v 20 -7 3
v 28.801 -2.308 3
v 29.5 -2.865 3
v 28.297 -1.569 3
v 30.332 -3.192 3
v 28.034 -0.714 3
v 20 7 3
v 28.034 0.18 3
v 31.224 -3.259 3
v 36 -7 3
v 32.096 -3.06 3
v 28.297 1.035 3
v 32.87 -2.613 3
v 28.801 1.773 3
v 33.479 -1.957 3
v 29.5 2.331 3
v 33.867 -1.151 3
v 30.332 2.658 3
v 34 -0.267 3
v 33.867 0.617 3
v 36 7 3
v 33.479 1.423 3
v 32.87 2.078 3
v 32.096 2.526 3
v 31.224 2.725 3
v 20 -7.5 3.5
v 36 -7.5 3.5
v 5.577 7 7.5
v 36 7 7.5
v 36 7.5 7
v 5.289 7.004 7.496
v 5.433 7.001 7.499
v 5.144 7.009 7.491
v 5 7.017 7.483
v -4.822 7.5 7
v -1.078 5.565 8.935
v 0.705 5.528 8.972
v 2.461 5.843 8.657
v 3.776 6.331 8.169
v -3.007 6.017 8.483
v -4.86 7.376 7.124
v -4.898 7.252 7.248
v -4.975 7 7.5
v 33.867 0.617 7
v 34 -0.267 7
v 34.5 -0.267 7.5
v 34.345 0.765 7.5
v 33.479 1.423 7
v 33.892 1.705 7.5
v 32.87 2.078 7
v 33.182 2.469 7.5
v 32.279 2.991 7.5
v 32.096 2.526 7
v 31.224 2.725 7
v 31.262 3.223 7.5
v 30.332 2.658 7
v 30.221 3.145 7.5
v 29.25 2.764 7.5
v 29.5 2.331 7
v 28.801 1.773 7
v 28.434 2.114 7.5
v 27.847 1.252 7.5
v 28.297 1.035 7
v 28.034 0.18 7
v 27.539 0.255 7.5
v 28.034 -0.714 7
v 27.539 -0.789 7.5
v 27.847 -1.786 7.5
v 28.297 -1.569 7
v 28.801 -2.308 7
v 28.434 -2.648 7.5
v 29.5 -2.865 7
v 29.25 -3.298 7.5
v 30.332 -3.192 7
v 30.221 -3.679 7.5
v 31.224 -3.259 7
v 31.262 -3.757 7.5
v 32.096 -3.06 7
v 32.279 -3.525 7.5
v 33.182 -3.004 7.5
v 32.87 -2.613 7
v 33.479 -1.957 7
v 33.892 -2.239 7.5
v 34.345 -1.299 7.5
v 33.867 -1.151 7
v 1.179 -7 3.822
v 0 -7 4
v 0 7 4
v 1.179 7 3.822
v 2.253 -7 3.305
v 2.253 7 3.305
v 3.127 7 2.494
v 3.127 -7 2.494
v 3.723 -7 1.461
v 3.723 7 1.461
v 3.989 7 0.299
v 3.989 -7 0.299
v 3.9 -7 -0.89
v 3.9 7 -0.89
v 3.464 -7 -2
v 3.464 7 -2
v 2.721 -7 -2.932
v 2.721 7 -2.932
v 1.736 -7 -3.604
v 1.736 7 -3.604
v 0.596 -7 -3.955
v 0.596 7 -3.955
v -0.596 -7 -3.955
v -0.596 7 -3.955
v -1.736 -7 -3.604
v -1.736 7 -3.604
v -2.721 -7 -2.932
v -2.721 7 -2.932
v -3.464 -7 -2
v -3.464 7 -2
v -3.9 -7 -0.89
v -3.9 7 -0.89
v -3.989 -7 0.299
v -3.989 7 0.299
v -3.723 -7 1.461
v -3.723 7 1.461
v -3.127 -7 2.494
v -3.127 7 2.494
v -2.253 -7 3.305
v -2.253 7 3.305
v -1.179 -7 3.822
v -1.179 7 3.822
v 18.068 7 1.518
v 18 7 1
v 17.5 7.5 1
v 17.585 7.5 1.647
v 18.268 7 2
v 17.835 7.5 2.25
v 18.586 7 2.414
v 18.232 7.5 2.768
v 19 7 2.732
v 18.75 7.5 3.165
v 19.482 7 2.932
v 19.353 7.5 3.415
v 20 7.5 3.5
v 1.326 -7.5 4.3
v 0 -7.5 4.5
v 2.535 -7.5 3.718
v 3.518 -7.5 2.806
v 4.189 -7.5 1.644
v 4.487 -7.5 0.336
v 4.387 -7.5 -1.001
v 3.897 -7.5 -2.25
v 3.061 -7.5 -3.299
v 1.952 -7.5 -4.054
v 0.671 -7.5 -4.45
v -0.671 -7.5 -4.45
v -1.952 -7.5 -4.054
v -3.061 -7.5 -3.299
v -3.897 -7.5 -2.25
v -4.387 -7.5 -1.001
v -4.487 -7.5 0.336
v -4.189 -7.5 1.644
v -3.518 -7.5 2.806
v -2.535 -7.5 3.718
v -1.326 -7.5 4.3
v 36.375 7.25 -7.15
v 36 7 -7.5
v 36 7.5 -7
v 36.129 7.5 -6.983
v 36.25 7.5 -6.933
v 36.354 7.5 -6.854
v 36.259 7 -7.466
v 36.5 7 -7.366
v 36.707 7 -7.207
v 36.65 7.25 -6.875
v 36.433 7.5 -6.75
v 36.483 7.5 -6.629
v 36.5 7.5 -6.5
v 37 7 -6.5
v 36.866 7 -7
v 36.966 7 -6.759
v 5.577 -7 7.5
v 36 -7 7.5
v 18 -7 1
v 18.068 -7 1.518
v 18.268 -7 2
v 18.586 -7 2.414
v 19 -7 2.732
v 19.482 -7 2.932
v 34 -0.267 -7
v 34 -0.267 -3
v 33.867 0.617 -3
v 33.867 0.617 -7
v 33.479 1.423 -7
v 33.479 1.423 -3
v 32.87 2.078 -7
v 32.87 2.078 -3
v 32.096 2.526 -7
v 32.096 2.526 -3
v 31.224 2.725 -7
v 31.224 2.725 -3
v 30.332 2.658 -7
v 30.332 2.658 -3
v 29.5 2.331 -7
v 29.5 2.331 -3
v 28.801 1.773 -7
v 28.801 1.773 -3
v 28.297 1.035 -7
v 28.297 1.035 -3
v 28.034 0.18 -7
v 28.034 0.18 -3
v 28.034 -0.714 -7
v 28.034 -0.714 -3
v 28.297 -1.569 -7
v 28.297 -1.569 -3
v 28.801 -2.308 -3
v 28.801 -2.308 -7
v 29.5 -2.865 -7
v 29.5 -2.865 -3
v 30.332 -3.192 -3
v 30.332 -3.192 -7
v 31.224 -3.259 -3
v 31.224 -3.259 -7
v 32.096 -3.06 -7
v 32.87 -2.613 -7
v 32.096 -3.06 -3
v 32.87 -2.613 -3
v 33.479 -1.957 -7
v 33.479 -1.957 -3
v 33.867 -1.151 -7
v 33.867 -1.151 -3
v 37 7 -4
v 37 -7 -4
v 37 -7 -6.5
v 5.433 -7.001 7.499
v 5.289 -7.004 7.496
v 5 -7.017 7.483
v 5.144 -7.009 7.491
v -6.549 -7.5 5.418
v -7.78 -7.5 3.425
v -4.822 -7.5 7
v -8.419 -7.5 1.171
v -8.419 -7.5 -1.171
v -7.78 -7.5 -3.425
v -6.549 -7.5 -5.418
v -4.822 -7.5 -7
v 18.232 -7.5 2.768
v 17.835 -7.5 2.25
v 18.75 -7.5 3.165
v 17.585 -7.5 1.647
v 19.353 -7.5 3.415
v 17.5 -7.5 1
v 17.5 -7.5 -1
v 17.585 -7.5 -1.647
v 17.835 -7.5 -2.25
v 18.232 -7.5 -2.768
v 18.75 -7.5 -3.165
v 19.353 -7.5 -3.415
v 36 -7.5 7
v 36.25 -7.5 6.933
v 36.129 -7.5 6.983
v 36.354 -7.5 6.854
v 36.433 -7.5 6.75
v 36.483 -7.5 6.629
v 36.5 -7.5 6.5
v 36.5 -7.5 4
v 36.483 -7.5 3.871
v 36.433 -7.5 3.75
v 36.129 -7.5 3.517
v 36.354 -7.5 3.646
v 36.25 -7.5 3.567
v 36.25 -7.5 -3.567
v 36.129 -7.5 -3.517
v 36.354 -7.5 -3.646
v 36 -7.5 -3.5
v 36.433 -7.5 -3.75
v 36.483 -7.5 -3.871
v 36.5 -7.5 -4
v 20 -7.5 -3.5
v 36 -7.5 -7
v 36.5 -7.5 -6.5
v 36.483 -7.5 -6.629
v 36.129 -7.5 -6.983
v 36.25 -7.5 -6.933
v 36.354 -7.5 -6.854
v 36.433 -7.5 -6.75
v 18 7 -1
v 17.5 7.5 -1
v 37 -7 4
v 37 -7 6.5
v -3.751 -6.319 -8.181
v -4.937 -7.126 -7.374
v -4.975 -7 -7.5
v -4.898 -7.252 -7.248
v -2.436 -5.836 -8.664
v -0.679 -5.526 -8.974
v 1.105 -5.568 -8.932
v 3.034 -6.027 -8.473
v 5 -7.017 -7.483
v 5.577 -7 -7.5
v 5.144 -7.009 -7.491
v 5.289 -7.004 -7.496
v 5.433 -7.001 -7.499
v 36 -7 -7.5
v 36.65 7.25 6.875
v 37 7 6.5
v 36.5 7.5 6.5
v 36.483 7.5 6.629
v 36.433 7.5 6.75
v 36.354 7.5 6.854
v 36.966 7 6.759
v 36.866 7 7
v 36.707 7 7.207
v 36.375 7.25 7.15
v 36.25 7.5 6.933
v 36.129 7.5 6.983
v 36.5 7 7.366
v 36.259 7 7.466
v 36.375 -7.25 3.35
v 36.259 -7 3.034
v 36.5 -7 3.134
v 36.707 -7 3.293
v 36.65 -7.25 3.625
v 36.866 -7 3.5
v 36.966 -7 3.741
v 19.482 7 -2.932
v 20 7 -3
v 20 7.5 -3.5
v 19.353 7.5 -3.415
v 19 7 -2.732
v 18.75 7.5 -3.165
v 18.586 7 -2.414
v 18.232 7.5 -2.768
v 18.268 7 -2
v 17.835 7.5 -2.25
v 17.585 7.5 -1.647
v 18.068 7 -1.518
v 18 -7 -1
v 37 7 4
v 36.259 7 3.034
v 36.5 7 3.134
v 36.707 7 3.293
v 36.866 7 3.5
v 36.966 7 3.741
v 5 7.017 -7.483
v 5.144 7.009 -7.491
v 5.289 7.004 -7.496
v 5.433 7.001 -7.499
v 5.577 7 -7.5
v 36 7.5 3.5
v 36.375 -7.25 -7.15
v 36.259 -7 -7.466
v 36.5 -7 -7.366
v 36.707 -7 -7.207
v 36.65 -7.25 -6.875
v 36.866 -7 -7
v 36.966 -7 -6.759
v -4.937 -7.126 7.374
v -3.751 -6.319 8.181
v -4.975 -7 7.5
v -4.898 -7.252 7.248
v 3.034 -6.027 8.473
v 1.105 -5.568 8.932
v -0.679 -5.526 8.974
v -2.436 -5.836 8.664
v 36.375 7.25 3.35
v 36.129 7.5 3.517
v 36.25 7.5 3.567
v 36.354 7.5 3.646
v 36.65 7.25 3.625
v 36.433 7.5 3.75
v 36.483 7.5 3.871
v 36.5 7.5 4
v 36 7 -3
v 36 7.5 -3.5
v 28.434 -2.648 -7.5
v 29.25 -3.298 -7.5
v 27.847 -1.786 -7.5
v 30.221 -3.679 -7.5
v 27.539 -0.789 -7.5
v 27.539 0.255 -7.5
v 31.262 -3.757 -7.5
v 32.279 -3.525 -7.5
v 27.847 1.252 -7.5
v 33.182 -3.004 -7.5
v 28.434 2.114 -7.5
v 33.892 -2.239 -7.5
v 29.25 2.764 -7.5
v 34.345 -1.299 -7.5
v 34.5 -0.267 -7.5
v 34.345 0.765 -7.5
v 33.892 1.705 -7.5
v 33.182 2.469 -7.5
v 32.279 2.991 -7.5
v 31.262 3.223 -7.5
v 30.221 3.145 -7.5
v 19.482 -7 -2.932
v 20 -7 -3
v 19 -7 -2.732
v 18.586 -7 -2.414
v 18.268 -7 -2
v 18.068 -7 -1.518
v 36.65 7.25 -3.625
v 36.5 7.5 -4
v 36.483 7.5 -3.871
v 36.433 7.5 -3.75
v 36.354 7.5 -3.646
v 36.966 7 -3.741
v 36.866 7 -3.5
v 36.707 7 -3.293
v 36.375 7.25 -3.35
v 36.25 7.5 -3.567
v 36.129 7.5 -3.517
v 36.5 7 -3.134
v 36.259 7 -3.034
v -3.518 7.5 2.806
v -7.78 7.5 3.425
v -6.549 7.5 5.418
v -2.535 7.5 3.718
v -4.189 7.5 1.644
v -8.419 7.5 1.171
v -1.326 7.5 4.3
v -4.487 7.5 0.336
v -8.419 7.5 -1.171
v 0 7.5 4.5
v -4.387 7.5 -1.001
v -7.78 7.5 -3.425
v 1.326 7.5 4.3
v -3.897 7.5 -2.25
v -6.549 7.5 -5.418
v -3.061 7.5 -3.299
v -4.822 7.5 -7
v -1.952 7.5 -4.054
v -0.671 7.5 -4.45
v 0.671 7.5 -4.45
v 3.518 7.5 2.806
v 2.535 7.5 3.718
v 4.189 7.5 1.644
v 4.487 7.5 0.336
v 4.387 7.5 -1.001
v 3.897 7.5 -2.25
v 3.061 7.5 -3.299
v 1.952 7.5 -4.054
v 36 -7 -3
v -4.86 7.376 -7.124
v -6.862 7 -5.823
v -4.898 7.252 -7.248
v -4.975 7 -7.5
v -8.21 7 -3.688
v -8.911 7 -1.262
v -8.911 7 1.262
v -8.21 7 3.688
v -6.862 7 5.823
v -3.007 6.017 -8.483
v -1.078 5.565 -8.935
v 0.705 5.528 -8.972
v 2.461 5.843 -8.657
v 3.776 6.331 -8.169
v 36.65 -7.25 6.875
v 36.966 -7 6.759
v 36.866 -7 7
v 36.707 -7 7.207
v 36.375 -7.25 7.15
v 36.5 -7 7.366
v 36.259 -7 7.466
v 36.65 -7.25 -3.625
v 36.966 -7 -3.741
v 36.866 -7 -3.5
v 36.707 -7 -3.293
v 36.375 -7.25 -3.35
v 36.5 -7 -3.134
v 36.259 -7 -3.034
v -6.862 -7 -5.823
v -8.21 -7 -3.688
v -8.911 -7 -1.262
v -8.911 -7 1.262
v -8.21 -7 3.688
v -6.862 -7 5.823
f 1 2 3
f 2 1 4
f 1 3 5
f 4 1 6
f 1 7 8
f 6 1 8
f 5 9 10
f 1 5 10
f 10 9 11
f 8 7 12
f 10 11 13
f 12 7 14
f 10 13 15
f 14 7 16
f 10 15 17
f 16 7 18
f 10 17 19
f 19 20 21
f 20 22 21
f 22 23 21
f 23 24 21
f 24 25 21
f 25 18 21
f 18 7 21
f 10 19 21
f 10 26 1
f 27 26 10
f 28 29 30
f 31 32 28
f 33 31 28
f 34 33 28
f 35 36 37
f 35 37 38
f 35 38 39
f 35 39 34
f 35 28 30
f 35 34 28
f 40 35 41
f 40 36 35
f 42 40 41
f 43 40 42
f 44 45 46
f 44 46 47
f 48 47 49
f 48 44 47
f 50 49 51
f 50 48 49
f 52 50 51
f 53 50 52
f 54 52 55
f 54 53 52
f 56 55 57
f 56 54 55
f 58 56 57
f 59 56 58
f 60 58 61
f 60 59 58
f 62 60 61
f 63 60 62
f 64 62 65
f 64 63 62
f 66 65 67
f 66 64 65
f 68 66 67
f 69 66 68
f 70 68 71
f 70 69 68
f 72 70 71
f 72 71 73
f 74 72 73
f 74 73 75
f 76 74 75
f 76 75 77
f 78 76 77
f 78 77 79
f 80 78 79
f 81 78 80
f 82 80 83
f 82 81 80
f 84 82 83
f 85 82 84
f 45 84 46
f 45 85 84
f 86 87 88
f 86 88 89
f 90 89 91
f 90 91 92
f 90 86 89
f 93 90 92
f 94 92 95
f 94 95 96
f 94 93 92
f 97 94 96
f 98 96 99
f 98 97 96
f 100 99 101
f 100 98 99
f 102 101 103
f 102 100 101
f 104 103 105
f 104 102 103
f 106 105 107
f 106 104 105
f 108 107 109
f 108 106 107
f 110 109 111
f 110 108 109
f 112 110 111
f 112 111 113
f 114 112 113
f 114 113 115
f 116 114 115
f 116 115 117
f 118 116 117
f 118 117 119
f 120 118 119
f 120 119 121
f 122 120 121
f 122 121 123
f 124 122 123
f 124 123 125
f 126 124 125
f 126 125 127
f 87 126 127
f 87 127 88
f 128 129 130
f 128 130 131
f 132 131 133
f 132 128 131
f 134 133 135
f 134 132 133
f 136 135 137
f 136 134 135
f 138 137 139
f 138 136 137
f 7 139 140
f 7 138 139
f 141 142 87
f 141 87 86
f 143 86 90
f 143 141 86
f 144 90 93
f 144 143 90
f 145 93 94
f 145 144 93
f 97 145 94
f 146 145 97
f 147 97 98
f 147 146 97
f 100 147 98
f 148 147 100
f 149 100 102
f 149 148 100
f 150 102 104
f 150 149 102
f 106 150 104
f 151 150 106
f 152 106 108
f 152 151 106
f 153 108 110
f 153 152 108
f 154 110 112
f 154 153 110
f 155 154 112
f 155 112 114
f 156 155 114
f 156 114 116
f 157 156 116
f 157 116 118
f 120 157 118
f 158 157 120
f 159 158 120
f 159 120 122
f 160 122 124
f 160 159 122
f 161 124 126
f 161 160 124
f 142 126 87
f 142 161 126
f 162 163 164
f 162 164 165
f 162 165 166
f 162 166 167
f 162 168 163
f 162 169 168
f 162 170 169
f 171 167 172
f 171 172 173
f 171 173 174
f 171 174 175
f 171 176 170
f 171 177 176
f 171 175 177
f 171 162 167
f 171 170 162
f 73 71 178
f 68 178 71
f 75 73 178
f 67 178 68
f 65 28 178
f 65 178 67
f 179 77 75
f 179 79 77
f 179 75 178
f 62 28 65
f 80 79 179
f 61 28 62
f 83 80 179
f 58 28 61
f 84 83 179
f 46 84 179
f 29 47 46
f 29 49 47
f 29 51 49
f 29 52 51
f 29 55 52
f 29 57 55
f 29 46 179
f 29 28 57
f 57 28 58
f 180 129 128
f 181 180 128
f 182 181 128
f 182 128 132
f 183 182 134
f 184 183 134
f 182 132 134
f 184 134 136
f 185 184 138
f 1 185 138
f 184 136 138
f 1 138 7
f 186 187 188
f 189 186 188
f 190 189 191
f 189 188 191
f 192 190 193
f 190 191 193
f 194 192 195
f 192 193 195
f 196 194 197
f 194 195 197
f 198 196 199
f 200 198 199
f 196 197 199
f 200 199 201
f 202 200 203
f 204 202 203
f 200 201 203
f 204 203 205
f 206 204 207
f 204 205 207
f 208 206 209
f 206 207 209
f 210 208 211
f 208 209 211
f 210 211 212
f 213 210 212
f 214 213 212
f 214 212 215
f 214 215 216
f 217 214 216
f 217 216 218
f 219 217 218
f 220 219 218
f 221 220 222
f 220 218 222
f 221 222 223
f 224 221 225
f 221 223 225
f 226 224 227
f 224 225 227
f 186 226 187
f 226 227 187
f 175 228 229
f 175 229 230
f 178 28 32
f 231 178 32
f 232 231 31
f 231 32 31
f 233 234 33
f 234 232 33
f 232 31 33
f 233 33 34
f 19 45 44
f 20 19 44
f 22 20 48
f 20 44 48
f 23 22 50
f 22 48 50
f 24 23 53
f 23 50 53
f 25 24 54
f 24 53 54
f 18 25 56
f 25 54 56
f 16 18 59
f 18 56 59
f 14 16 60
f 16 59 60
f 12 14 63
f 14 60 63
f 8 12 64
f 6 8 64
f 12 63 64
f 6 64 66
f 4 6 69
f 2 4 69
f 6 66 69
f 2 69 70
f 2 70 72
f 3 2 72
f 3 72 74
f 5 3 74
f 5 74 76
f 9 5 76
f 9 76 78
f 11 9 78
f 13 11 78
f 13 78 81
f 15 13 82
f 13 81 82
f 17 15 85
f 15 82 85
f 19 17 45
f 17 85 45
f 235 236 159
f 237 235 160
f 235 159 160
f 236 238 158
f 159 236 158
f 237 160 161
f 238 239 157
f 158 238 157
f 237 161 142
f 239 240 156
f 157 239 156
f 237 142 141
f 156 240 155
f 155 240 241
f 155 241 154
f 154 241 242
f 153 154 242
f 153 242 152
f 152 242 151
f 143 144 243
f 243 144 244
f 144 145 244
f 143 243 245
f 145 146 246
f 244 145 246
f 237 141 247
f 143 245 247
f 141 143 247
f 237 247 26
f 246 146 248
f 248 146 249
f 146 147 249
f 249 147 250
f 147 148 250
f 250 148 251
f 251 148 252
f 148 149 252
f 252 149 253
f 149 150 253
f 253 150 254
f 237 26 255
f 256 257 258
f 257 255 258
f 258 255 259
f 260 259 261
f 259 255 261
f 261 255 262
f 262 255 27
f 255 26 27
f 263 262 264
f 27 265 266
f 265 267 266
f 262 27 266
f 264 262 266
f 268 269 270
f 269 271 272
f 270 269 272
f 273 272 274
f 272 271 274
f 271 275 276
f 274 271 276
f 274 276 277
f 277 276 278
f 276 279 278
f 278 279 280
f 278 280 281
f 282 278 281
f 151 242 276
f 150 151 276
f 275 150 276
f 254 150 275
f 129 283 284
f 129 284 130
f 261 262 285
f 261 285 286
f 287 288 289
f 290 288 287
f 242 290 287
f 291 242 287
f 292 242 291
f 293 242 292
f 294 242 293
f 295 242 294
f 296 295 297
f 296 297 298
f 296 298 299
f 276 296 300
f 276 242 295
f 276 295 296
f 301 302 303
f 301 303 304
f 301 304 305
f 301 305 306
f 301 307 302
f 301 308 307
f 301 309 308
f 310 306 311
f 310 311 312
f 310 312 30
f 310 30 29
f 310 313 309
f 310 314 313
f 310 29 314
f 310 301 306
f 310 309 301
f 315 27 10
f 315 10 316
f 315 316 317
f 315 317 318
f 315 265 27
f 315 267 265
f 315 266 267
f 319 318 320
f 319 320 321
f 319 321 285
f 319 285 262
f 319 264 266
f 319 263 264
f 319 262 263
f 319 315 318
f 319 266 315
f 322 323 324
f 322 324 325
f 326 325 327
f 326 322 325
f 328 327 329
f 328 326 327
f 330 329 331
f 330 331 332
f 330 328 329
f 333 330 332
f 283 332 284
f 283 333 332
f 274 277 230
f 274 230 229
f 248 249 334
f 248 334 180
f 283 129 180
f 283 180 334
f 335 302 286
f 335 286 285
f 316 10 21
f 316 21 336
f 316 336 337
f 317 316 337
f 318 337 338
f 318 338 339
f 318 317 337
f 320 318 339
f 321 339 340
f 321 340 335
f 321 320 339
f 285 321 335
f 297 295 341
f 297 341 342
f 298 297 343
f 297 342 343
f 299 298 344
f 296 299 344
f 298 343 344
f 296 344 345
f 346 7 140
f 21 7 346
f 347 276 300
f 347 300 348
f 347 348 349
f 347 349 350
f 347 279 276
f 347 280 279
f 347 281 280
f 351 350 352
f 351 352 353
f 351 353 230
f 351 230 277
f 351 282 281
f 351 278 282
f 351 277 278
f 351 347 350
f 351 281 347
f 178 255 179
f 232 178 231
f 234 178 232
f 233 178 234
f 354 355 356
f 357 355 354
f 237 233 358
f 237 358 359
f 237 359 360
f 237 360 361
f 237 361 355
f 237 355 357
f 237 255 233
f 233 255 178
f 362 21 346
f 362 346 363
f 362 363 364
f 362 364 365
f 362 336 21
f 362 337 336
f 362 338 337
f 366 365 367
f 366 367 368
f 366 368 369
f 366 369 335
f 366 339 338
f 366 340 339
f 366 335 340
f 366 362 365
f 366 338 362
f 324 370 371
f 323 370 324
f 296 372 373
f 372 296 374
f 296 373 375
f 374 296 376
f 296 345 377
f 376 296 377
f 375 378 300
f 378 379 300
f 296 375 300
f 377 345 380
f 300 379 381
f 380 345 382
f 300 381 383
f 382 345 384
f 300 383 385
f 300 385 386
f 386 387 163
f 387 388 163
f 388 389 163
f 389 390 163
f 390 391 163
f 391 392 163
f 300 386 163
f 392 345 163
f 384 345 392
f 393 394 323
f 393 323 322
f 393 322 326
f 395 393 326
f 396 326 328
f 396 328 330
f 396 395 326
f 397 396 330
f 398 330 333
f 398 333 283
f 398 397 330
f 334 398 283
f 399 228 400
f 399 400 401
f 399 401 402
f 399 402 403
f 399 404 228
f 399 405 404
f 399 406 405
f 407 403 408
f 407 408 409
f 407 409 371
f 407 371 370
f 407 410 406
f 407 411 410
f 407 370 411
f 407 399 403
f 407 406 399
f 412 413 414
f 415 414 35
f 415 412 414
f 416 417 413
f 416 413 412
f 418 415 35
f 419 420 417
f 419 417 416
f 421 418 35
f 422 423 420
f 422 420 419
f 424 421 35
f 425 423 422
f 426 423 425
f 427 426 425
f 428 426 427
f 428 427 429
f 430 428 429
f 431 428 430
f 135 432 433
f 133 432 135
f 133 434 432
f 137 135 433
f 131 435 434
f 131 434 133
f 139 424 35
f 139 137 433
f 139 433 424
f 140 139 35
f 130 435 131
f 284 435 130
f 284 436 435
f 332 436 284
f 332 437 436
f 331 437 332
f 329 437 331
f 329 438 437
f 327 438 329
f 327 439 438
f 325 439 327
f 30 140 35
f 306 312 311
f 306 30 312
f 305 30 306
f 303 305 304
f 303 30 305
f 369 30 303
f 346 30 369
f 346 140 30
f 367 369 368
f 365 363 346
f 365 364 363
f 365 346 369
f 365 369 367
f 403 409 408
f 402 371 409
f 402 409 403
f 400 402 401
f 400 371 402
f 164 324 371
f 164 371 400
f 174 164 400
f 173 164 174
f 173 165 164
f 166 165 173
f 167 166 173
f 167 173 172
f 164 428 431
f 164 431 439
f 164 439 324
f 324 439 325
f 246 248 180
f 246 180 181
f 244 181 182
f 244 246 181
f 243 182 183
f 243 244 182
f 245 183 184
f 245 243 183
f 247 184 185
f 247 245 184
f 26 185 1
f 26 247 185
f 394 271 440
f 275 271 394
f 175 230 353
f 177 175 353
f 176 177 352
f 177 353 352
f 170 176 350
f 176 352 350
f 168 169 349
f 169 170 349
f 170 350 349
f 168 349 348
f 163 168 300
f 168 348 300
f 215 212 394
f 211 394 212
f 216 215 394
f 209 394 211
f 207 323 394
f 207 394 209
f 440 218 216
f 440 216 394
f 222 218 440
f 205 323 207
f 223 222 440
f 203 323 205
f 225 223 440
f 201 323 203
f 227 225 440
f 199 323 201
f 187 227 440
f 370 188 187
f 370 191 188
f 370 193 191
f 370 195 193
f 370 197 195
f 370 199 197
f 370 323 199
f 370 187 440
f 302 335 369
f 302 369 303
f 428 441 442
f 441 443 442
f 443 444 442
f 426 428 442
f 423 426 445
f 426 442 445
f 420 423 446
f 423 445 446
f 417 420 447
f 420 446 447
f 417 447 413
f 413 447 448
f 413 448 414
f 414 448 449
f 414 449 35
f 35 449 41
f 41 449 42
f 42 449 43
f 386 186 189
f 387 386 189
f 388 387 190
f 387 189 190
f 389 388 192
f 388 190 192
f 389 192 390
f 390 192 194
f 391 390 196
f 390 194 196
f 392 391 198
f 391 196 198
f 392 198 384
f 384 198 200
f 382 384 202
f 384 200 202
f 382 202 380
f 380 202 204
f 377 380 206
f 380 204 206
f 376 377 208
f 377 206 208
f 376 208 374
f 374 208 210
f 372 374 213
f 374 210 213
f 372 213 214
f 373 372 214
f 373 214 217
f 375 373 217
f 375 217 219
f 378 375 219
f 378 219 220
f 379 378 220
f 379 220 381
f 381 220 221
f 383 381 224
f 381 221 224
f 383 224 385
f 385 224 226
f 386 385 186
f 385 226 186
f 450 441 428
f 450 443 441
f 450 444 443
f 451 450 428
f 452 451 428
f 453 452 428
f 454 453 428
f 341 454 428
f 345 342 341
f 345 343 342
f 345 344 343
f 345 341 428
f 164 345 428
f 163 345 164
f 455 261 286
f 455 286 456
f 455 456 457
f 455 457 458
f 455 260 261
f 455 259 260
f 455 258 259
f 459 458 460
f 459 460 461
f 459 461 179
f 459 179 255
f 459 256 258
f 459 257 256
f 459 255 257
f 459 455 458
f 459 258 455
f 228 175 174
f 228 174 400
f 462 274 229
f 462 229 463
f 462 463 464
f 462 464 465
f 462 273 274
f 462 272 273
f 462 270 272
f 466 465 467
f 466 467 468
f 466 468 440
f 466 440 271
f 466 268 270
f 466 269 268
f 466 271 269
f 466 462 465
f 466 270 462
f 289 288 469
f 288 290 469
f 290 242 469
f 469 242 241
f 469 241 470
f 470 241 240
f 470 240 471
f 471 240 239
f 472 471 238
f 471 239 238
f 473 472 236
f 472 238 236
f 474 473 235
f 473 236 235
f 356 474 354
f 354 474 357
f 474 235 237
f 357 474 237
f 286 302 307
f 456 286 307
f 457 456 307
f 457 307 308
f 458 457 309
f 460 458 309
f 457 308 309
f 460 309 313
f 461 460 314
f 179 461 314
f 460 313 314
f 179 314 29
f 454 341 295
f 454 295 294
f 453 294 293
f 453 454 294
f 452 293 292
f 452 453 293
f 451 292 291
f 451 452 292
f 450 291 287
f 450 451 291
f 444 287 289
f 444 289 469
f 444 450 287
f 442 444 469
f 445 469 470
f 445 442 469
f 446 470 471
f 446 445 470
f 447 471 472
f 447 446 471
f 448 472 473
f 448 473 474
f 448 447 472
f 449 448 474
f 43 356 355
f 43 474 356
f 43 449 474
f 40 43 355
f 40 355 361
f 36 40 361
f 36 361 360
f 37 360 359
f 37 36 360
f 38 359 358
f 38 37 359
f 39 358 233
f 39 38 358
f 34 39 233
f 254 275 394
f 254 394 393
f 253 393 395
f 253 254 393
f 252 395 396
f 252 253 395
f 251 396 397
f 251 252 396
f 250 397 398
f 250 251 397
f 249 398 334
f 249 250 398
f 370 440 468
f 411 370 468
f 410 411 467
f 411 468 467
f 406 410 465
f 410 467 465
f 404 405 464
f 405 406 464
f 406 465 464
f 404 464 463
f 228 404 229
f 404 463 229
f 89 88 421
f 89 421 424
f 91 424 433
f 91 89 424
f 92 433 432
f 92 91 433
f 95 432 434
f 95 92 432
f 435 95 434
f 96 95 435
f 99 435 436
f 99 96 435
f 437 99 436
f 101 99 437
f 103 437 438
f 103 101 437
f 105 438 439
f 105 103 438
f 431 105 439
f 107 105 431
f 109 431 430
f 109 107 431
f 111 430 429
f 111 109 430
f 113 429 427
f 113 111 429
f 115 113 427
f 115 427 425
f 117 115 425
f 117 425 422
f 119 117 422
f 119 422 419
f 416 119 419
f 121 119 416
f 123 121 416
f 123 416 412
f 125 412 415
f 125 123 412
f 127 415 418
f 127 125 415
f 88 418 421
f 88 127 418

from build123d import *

# Parameters (mm, degrees)
SKETCH1_R           = 9
SKETCH1_R_2         = 4
BOSS_EXTRUDE1_DEPTH = 7.5
SKETCH2_W           = 32
SKETCH2_H           = 15
BOSS_EXTRUDE2_DEPTH = 7.5
SKETCH3_W           = 38
SKETCH3_H           = 6
CUT_EXTRUDE1_DEPTH  = 19
SKETCH4_R           = 3
CUT_EXTRUDE2_DEPTH  = 22
FILLET1_R           = 2
FILLET2_R           = 1
CHAMFER1_SIZE       = 0.5
CHAMFER2_SIZE       = 0.5
CHAMFER3_SIZE       = 0.5
FILLET3_R           = 10


with BuildPart() as part:
    # Sketch1 → Boss-Extrude1 (new, symmetric)
    with BuildSketch(Plane(origin=(0, 0, 0), x_dir=(1, 0, 0), z_dir=(0, 1, 0))):
        with Locations(Location((0, 0, 0), (0, 0, 270))):
            Circle(SKETCH1_R)
        with Locations(Location((0, 0, 0), (0, 0, 270))):
            Circle(SKETCH1_R_2, mode=Mode.SUBTRACT)
    extrude(amount=BOSS_EXTRUDE1_DEPTH, both=True)

    # Sketch2 → Boss-Extrude2 (add, symmetric)
    with BuildSketch(Plane(origin=(0, 0, 0), x_dir=(1, 0, 0), z_dir=(0, 1, 0))):
        with Locations((21, 0)):
            Rectangle(SKETCH2_W, SKETCH2_H)
    extrude(amount=BOSS_EXTRUDE2_DEPTH, both=True)

    # Sketch3 → Cut-Extrude1 (cut, symmetric)
    with BuildSketch(Plane(origin=(0, 0, 0), x_dir=(1, 0, 0), z_dir=(0, 1, 0))):
        with Locations((37, 0)):
            Rectangle(SKETCH3_W, SKETCH3_H)
    extrude(amount=CUT_EXTRUDE1_DEPTH, both=True, mode=Mode.SUBTRACT)

    # Sketch4 → Cut-Extrude2 (cut, symmetric)
    with BuildSketch(Plane.XY.offset(-3)):
        with Locations((31, -0.267092661)):
            Circle(SKETCH4_R)
    extrude(amount=CUT_EXTRUDE2_DEPTH, both=True, mode=Mode.SUBTRACT)

    # Fillet1
    fillet1_edges = [part.edges().sort_by_distance(p)[0] for p in [
        (18, 0, 3),
        (18, 0, -3),
    ]]
    fillet(fillet1_edges, radius=FILLET1_R)

    # Fillet2
    fillet2_edges = [part.edges().sort_by_distance(p)[0] for p in [
        (37, 0, 7.5),
        (37, 0, -7.5),
        (37, 0, -3),
        (37, 0, 3),
    ]]
    fillet(fillet2_edges, radius=FILLET2_R)

    # Chamfer1
    chamfer1_edges = [part.edges().sort_by_distance(p)[0] for p in [
        (28, -0.267092661, 7.5),
        (28, -0.267092661, -7.5),
        (0, -7.5, -4),
        (0, 7.5, -4),
    ]]
    chamfer(chamfer1_edges, length=CHAMFER1_SIZE)

    # Chamfer2
    chamfer2_edges = [part.edges().sort_by_distance(p)[0] for p in [
        (20.5, 7.5, -7.5),
        (20.5, -7.5, -7.5),
        (36.707106781, -7.5, -7.207106781),
        (37, -7.5, -5.25),
        (37, 7.5, -5.25),
        (36.707106781, -7.5, -3.292893219),
        (28, -7.5, -3),
        (18.585786438, -7.5, -2.414213562),
        (18, -7.5, 0),
        (18.585786438, -7.5, 2.414213562),
        (28, -7.5, 3),
        (36.707106781, -7.5, 3.292893219),
        (37, -7.5, 5.25),
        (37, 7.5, 5.25),
        (36.707106781, -7.5, 7.207106781),
        (20.5, -7.5, 7.5),
        (20.5, 7.5, 7.5),
        (36.707106781, 7.5, -7.207106781),
        (36.707106781, 7.5, -3.292893219),
        (28, 7.5, -3),
        (18.585786438, 7.5, -2.414213562),
        (18, 7.5, 0),
        (18.585786438, 7.5, 2.414213562),
        (28, 7.5, 3),
        (36.707106781, 7.5, 3.292893219),
        (36.707106781, 7.5, 7.207106781),
    ]]
    chamfer(chamfer2_edges, length=CHAMFER2_SIZE)

    # Chamfer3
    chamfer3_edges = [part.edges().sort_by_distance(p)[0] for p in [
        (-9, 7.5, 0),
        (-9, -7.5, 0),
    ]]
    chamfer(chamfer3_edges, length=CHAMFER3_SIZE)

    # Fillet3
    # the kernel refuses this fillet: 10 mm, written as the material it takes off along each edge
    with BuildSketch(Plane(origin=(5, 8.443576575, -7.5), x_dir=(0, 0, 1), z_dir=(0, -1, 0))) as fillet3_piece_1:
        with BuildLine():
            CenterArc((10, -0.57743063), FILLET3_R, 176.6897249, 3.3102751)
            Line((0, -0.57743063), (0, 0))
            Line((0, 0), (0.016685226, 0))
        make_face()
    extrude(amount=16.887153149, mode=Mode.SUBTRACT)
    with BuildSketch(Plane(origin=(5, 8.443576575, 7.5), x_dir=(0, 0, -1), z_dir=(0, -1, 0))) as fillet3_piece_2:
        with BuildLine():
            CenterArc((10, 0.57743063), FILLET3_R, 180, 3.3102751)
            Line((0, 0.57743063), (0, 0))
            Line((0, 0), (0.016685226, 0))
        make_face()
    extrude(amount=16.887153149, mode=Mode.SUBTRACT)


solid = part.part
